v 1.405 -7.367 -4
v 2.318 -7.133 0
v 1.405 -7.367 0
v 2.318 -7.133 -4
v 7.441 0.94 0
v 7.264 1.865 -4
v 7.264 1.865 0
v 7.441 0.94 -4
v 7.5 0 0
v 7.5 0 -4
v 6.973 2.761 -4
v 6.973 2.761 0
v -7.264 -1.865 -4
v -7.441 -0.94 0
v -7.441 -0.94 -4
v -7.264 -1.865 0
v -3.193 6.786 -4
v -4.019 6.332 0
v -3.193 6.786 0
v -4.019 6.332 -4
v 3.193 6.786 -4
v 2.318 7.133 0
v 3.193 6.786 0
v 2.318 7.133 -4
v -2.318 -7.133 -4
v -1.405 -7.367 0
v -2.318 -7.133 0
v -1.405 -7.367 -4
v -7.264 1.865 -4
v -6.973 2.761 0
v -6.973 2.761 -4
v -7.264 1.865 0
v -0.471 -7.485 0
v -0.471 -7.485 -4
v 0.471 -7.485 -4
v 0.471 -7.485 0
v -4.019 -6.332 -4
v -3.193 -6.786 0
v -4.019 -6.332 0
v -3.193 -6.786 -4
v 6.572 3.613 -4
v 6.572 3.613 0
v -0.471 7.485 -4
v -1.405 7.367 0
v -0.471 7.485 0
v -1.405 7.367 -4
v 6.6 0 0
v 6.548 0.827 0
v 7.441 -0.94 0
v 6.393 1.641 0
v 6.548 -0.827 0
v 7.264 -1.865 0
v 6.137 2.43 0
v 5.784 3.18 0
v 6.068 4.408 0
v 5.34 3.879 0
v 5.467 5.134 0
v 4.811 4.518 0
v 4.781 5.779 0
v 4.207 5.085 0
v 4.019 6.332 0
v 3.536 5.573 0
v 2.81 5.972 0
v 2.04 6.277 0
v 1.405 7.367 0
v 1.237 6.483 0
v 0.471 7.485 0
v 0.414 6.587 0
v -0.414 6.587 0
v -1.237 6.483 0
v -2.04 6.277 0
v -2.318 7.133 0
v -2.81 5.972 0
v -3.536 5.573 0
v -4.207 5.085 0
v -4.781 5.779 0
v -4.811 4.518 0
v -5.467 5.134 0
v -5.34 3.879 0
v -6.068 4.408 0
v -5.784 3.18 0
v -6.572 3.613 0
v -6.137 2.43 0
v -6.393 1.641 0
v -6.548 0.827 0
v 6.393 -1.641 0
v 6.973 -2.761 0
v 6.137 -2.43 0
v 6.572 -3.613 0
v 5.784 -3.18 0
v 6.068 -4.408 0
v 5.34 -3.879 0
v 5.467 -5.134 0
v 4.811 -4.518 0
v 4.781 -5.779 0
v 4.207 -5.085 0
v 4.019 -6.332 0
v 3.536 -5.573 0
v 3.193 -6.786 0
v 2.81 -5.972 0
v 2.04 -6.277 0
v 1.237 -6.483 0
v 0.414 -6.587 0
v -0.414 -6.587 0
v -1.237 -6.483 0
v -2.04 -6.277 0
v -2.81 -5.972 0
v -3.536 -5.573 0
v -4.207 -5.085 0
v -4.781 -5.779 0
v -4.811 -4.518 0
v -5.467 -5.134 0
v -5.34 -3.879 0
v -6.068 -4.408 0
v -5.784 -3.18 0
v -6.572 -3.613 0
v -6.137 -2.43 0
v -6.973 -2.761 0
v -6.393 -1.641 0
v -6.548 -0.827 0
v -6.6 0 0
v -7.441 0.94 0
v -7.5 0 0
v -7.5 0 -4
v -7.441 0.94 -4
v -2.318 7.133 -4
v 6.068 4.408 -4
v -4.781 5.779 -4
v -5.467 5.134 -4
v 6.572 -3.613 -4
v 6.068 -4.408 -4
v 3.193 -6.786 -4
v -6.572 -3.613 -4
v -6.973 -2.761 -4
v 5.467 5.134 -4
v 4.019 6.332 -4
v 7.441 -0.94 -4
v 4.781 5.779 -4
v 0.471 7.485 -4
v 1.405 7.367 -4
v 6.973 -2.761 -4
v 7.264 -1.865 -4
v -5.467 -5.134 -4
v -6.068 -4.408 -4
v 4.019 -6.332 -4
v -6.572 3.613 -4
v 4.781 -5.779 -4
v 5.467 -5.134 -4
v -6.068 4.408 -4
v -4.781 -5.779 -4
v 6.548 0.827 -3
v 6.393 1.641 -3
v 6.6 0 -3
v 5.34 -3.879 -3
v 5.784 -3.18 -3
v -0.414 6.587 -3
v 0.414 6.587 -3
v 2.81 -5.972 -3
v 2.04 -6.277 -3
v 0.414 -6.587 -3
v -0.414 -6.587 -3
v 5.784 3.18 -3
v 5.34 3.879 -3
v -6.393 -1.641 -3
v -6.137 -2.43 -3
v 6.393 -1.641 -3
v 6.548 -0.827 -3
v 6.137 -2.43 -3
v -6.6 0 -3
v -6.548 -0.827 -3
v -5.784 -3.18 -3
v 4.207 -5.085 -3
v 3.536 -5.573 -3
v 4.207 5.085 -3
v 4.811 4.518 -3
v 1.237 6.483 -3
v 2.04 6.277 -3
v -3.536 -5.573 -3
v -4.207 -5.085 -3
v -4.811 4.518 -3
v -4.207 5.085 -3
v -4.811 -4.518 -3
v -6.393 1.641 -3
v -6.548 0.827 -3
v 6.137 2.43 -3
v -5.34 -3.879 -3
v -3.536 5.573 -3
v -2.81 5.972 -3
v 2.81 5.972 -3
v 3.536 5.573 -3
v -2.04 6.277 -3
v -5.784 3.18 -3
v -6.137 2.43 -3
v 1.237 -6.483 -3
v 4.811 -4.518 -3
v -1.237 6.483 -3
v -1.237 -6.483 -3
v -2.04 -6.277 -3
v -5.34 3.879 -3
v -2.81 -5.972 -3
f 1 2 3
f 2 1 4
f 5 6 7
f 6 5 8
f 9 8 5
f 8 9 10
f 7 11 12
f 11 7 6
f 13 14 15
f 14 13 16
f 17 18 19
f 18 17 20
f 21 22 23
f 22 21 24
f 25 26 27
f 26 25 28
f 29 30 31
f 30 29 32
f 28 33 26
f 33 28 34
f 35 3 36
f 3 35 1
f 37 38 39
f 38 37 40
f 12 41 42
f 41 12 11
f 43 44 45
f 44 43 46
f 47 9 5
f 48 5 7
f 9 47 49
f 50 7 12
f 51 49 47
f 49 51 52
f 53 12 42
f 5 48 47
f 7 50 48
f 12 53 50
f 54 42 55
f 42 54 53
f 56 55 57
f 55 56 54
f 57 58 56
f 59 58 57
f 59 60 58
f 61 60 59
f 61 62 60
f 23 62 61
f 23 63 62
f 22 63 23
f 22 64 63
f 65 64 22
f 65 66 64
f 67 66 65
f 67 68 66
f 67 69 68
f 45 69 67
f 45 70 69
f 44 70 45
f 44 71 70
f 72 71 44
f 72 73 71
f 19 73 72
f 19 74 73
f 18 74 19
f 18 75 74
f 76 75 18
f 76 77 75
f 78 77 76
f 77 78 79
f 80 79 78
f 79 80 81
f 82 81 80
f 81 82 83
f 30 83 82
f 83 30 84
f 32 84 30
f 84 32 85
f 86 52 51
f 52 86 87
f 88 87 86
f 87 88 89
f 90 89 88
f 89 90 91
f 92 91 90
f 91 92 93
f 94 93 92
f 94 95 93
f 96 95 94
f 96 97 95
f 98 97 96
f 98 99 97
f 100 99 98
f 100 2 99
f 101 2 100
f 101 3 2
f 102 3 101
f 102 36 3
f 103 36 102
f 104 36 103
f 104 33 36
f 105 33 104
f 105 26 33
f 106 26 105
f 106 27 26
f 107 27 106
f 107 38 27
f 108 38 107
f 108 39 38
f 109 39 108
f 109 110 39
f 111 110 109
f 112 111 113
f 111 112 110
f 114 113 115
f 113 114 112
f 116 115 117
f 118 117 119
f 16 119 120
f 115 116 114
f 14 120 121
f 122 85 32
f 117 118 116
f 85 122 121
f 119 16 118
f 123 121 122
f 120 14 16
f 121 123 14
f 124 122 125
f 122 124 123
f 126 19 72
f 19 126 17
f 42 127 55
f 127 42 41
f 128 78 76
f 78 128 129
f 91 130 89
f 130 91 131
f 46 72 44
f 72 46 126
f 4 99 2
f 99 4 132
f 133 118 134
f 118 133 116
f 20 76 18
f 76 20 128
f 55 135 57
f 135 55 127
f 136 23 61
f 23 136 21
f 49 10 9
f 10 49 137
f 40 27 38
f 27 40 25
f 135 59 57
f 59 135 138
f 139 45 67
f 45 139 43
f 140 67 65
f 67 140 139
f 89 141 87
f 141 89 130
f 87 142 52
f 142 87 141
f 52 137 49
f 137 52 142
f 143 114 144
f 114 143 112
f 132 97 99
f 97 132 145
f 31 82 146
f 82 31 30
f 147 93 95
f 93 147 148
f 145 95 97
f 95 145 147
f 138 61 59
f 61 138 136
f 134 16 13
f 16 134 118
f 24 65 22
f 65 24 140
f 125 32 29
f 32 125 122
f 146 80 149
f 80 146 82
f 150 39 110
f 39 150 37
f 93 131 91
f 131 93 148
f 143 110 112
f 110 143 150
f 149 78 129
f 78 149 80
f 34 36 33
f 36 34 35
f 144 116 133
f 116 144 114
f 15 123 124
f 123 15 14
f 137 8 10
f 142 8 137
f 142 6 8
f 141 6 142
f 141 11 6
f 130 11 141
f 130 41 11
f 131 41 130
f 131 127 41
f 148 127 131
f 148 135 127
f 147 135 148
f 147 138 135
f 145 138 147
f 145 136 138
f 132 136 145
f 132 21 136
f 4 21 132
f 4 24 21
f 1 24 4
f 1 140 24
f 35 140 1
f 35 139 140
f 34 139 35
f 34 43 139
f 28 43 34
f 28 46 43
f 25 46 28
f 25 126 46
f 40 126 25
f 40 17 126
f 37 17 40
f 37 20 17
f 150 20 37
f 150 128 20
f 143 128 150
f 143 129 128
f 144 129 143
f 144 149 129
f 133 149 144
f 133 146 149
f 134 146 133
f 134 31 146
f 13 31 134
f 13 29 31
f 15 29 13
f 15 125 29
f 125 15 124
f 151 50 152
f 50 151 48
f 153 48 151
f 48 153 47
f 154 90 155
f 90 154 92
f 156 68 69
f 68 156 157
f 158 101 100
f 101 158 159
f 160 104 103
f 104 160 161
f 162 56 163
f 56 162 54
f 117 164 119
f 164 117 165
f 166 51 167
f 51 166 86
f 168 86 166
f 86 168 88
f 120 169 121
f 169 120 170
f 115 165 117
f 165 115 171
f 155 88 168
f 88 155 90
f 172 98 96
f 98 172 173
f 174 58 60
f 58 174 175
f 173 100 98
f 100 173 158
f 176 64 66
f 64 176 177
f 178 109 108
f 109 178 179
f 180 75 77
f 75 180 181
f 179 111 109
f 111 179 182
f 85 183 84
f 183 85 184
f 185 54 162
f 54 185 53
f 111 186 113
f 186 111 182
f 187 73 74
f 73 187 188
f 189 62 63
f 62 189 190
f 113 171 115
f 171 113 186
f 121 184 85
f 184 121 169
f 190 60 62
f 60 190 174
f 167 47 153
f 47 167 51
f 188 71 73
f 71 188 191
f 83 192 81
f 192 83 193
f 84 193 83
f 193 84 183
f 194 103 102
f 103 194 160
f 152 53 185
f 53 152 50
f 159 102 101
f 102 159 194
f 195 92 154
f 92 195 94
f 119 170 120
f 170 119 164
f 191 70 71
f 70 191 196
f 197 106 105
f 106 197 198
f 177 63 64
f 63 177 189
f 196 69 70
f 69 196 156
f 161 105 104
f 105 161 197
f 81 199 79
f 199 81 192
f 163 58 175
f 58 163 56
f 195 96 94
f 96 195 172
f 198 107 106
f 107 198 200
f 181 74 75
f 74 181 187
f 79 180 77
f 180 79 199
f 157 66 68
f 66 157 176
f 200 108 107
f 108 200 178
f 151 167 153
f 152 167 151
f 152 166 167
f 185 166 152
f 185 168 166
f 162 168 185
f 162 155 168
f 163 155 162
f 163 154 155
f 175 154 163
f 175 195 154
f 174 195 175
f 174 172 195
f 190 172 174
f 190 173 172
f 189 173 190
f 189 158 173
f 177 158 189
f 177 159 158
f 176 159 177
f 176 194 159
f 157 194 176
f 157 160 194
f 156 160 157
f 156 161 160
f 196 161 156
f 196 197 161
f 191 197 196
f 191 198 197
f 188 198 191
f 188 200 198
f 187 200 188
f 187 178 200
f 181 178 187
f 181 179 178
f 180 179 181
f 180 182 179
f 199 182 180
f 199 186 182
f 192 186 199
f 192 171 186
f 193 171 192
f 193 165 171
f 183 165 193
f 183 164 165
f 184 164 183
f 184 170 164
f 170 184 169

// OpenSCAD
$fn = 50;


difference() {
	union() {
		translate(v = [0, 0, -4.0000000000]) {
			cylinder(h = 4, r = 7.5000000000);
		}
	}
	union() {
		#translate(v = [0, 0, -3.0000000000]) {
			cylinder(h = 3, r = 6.6000000000);
		}
	}
}
